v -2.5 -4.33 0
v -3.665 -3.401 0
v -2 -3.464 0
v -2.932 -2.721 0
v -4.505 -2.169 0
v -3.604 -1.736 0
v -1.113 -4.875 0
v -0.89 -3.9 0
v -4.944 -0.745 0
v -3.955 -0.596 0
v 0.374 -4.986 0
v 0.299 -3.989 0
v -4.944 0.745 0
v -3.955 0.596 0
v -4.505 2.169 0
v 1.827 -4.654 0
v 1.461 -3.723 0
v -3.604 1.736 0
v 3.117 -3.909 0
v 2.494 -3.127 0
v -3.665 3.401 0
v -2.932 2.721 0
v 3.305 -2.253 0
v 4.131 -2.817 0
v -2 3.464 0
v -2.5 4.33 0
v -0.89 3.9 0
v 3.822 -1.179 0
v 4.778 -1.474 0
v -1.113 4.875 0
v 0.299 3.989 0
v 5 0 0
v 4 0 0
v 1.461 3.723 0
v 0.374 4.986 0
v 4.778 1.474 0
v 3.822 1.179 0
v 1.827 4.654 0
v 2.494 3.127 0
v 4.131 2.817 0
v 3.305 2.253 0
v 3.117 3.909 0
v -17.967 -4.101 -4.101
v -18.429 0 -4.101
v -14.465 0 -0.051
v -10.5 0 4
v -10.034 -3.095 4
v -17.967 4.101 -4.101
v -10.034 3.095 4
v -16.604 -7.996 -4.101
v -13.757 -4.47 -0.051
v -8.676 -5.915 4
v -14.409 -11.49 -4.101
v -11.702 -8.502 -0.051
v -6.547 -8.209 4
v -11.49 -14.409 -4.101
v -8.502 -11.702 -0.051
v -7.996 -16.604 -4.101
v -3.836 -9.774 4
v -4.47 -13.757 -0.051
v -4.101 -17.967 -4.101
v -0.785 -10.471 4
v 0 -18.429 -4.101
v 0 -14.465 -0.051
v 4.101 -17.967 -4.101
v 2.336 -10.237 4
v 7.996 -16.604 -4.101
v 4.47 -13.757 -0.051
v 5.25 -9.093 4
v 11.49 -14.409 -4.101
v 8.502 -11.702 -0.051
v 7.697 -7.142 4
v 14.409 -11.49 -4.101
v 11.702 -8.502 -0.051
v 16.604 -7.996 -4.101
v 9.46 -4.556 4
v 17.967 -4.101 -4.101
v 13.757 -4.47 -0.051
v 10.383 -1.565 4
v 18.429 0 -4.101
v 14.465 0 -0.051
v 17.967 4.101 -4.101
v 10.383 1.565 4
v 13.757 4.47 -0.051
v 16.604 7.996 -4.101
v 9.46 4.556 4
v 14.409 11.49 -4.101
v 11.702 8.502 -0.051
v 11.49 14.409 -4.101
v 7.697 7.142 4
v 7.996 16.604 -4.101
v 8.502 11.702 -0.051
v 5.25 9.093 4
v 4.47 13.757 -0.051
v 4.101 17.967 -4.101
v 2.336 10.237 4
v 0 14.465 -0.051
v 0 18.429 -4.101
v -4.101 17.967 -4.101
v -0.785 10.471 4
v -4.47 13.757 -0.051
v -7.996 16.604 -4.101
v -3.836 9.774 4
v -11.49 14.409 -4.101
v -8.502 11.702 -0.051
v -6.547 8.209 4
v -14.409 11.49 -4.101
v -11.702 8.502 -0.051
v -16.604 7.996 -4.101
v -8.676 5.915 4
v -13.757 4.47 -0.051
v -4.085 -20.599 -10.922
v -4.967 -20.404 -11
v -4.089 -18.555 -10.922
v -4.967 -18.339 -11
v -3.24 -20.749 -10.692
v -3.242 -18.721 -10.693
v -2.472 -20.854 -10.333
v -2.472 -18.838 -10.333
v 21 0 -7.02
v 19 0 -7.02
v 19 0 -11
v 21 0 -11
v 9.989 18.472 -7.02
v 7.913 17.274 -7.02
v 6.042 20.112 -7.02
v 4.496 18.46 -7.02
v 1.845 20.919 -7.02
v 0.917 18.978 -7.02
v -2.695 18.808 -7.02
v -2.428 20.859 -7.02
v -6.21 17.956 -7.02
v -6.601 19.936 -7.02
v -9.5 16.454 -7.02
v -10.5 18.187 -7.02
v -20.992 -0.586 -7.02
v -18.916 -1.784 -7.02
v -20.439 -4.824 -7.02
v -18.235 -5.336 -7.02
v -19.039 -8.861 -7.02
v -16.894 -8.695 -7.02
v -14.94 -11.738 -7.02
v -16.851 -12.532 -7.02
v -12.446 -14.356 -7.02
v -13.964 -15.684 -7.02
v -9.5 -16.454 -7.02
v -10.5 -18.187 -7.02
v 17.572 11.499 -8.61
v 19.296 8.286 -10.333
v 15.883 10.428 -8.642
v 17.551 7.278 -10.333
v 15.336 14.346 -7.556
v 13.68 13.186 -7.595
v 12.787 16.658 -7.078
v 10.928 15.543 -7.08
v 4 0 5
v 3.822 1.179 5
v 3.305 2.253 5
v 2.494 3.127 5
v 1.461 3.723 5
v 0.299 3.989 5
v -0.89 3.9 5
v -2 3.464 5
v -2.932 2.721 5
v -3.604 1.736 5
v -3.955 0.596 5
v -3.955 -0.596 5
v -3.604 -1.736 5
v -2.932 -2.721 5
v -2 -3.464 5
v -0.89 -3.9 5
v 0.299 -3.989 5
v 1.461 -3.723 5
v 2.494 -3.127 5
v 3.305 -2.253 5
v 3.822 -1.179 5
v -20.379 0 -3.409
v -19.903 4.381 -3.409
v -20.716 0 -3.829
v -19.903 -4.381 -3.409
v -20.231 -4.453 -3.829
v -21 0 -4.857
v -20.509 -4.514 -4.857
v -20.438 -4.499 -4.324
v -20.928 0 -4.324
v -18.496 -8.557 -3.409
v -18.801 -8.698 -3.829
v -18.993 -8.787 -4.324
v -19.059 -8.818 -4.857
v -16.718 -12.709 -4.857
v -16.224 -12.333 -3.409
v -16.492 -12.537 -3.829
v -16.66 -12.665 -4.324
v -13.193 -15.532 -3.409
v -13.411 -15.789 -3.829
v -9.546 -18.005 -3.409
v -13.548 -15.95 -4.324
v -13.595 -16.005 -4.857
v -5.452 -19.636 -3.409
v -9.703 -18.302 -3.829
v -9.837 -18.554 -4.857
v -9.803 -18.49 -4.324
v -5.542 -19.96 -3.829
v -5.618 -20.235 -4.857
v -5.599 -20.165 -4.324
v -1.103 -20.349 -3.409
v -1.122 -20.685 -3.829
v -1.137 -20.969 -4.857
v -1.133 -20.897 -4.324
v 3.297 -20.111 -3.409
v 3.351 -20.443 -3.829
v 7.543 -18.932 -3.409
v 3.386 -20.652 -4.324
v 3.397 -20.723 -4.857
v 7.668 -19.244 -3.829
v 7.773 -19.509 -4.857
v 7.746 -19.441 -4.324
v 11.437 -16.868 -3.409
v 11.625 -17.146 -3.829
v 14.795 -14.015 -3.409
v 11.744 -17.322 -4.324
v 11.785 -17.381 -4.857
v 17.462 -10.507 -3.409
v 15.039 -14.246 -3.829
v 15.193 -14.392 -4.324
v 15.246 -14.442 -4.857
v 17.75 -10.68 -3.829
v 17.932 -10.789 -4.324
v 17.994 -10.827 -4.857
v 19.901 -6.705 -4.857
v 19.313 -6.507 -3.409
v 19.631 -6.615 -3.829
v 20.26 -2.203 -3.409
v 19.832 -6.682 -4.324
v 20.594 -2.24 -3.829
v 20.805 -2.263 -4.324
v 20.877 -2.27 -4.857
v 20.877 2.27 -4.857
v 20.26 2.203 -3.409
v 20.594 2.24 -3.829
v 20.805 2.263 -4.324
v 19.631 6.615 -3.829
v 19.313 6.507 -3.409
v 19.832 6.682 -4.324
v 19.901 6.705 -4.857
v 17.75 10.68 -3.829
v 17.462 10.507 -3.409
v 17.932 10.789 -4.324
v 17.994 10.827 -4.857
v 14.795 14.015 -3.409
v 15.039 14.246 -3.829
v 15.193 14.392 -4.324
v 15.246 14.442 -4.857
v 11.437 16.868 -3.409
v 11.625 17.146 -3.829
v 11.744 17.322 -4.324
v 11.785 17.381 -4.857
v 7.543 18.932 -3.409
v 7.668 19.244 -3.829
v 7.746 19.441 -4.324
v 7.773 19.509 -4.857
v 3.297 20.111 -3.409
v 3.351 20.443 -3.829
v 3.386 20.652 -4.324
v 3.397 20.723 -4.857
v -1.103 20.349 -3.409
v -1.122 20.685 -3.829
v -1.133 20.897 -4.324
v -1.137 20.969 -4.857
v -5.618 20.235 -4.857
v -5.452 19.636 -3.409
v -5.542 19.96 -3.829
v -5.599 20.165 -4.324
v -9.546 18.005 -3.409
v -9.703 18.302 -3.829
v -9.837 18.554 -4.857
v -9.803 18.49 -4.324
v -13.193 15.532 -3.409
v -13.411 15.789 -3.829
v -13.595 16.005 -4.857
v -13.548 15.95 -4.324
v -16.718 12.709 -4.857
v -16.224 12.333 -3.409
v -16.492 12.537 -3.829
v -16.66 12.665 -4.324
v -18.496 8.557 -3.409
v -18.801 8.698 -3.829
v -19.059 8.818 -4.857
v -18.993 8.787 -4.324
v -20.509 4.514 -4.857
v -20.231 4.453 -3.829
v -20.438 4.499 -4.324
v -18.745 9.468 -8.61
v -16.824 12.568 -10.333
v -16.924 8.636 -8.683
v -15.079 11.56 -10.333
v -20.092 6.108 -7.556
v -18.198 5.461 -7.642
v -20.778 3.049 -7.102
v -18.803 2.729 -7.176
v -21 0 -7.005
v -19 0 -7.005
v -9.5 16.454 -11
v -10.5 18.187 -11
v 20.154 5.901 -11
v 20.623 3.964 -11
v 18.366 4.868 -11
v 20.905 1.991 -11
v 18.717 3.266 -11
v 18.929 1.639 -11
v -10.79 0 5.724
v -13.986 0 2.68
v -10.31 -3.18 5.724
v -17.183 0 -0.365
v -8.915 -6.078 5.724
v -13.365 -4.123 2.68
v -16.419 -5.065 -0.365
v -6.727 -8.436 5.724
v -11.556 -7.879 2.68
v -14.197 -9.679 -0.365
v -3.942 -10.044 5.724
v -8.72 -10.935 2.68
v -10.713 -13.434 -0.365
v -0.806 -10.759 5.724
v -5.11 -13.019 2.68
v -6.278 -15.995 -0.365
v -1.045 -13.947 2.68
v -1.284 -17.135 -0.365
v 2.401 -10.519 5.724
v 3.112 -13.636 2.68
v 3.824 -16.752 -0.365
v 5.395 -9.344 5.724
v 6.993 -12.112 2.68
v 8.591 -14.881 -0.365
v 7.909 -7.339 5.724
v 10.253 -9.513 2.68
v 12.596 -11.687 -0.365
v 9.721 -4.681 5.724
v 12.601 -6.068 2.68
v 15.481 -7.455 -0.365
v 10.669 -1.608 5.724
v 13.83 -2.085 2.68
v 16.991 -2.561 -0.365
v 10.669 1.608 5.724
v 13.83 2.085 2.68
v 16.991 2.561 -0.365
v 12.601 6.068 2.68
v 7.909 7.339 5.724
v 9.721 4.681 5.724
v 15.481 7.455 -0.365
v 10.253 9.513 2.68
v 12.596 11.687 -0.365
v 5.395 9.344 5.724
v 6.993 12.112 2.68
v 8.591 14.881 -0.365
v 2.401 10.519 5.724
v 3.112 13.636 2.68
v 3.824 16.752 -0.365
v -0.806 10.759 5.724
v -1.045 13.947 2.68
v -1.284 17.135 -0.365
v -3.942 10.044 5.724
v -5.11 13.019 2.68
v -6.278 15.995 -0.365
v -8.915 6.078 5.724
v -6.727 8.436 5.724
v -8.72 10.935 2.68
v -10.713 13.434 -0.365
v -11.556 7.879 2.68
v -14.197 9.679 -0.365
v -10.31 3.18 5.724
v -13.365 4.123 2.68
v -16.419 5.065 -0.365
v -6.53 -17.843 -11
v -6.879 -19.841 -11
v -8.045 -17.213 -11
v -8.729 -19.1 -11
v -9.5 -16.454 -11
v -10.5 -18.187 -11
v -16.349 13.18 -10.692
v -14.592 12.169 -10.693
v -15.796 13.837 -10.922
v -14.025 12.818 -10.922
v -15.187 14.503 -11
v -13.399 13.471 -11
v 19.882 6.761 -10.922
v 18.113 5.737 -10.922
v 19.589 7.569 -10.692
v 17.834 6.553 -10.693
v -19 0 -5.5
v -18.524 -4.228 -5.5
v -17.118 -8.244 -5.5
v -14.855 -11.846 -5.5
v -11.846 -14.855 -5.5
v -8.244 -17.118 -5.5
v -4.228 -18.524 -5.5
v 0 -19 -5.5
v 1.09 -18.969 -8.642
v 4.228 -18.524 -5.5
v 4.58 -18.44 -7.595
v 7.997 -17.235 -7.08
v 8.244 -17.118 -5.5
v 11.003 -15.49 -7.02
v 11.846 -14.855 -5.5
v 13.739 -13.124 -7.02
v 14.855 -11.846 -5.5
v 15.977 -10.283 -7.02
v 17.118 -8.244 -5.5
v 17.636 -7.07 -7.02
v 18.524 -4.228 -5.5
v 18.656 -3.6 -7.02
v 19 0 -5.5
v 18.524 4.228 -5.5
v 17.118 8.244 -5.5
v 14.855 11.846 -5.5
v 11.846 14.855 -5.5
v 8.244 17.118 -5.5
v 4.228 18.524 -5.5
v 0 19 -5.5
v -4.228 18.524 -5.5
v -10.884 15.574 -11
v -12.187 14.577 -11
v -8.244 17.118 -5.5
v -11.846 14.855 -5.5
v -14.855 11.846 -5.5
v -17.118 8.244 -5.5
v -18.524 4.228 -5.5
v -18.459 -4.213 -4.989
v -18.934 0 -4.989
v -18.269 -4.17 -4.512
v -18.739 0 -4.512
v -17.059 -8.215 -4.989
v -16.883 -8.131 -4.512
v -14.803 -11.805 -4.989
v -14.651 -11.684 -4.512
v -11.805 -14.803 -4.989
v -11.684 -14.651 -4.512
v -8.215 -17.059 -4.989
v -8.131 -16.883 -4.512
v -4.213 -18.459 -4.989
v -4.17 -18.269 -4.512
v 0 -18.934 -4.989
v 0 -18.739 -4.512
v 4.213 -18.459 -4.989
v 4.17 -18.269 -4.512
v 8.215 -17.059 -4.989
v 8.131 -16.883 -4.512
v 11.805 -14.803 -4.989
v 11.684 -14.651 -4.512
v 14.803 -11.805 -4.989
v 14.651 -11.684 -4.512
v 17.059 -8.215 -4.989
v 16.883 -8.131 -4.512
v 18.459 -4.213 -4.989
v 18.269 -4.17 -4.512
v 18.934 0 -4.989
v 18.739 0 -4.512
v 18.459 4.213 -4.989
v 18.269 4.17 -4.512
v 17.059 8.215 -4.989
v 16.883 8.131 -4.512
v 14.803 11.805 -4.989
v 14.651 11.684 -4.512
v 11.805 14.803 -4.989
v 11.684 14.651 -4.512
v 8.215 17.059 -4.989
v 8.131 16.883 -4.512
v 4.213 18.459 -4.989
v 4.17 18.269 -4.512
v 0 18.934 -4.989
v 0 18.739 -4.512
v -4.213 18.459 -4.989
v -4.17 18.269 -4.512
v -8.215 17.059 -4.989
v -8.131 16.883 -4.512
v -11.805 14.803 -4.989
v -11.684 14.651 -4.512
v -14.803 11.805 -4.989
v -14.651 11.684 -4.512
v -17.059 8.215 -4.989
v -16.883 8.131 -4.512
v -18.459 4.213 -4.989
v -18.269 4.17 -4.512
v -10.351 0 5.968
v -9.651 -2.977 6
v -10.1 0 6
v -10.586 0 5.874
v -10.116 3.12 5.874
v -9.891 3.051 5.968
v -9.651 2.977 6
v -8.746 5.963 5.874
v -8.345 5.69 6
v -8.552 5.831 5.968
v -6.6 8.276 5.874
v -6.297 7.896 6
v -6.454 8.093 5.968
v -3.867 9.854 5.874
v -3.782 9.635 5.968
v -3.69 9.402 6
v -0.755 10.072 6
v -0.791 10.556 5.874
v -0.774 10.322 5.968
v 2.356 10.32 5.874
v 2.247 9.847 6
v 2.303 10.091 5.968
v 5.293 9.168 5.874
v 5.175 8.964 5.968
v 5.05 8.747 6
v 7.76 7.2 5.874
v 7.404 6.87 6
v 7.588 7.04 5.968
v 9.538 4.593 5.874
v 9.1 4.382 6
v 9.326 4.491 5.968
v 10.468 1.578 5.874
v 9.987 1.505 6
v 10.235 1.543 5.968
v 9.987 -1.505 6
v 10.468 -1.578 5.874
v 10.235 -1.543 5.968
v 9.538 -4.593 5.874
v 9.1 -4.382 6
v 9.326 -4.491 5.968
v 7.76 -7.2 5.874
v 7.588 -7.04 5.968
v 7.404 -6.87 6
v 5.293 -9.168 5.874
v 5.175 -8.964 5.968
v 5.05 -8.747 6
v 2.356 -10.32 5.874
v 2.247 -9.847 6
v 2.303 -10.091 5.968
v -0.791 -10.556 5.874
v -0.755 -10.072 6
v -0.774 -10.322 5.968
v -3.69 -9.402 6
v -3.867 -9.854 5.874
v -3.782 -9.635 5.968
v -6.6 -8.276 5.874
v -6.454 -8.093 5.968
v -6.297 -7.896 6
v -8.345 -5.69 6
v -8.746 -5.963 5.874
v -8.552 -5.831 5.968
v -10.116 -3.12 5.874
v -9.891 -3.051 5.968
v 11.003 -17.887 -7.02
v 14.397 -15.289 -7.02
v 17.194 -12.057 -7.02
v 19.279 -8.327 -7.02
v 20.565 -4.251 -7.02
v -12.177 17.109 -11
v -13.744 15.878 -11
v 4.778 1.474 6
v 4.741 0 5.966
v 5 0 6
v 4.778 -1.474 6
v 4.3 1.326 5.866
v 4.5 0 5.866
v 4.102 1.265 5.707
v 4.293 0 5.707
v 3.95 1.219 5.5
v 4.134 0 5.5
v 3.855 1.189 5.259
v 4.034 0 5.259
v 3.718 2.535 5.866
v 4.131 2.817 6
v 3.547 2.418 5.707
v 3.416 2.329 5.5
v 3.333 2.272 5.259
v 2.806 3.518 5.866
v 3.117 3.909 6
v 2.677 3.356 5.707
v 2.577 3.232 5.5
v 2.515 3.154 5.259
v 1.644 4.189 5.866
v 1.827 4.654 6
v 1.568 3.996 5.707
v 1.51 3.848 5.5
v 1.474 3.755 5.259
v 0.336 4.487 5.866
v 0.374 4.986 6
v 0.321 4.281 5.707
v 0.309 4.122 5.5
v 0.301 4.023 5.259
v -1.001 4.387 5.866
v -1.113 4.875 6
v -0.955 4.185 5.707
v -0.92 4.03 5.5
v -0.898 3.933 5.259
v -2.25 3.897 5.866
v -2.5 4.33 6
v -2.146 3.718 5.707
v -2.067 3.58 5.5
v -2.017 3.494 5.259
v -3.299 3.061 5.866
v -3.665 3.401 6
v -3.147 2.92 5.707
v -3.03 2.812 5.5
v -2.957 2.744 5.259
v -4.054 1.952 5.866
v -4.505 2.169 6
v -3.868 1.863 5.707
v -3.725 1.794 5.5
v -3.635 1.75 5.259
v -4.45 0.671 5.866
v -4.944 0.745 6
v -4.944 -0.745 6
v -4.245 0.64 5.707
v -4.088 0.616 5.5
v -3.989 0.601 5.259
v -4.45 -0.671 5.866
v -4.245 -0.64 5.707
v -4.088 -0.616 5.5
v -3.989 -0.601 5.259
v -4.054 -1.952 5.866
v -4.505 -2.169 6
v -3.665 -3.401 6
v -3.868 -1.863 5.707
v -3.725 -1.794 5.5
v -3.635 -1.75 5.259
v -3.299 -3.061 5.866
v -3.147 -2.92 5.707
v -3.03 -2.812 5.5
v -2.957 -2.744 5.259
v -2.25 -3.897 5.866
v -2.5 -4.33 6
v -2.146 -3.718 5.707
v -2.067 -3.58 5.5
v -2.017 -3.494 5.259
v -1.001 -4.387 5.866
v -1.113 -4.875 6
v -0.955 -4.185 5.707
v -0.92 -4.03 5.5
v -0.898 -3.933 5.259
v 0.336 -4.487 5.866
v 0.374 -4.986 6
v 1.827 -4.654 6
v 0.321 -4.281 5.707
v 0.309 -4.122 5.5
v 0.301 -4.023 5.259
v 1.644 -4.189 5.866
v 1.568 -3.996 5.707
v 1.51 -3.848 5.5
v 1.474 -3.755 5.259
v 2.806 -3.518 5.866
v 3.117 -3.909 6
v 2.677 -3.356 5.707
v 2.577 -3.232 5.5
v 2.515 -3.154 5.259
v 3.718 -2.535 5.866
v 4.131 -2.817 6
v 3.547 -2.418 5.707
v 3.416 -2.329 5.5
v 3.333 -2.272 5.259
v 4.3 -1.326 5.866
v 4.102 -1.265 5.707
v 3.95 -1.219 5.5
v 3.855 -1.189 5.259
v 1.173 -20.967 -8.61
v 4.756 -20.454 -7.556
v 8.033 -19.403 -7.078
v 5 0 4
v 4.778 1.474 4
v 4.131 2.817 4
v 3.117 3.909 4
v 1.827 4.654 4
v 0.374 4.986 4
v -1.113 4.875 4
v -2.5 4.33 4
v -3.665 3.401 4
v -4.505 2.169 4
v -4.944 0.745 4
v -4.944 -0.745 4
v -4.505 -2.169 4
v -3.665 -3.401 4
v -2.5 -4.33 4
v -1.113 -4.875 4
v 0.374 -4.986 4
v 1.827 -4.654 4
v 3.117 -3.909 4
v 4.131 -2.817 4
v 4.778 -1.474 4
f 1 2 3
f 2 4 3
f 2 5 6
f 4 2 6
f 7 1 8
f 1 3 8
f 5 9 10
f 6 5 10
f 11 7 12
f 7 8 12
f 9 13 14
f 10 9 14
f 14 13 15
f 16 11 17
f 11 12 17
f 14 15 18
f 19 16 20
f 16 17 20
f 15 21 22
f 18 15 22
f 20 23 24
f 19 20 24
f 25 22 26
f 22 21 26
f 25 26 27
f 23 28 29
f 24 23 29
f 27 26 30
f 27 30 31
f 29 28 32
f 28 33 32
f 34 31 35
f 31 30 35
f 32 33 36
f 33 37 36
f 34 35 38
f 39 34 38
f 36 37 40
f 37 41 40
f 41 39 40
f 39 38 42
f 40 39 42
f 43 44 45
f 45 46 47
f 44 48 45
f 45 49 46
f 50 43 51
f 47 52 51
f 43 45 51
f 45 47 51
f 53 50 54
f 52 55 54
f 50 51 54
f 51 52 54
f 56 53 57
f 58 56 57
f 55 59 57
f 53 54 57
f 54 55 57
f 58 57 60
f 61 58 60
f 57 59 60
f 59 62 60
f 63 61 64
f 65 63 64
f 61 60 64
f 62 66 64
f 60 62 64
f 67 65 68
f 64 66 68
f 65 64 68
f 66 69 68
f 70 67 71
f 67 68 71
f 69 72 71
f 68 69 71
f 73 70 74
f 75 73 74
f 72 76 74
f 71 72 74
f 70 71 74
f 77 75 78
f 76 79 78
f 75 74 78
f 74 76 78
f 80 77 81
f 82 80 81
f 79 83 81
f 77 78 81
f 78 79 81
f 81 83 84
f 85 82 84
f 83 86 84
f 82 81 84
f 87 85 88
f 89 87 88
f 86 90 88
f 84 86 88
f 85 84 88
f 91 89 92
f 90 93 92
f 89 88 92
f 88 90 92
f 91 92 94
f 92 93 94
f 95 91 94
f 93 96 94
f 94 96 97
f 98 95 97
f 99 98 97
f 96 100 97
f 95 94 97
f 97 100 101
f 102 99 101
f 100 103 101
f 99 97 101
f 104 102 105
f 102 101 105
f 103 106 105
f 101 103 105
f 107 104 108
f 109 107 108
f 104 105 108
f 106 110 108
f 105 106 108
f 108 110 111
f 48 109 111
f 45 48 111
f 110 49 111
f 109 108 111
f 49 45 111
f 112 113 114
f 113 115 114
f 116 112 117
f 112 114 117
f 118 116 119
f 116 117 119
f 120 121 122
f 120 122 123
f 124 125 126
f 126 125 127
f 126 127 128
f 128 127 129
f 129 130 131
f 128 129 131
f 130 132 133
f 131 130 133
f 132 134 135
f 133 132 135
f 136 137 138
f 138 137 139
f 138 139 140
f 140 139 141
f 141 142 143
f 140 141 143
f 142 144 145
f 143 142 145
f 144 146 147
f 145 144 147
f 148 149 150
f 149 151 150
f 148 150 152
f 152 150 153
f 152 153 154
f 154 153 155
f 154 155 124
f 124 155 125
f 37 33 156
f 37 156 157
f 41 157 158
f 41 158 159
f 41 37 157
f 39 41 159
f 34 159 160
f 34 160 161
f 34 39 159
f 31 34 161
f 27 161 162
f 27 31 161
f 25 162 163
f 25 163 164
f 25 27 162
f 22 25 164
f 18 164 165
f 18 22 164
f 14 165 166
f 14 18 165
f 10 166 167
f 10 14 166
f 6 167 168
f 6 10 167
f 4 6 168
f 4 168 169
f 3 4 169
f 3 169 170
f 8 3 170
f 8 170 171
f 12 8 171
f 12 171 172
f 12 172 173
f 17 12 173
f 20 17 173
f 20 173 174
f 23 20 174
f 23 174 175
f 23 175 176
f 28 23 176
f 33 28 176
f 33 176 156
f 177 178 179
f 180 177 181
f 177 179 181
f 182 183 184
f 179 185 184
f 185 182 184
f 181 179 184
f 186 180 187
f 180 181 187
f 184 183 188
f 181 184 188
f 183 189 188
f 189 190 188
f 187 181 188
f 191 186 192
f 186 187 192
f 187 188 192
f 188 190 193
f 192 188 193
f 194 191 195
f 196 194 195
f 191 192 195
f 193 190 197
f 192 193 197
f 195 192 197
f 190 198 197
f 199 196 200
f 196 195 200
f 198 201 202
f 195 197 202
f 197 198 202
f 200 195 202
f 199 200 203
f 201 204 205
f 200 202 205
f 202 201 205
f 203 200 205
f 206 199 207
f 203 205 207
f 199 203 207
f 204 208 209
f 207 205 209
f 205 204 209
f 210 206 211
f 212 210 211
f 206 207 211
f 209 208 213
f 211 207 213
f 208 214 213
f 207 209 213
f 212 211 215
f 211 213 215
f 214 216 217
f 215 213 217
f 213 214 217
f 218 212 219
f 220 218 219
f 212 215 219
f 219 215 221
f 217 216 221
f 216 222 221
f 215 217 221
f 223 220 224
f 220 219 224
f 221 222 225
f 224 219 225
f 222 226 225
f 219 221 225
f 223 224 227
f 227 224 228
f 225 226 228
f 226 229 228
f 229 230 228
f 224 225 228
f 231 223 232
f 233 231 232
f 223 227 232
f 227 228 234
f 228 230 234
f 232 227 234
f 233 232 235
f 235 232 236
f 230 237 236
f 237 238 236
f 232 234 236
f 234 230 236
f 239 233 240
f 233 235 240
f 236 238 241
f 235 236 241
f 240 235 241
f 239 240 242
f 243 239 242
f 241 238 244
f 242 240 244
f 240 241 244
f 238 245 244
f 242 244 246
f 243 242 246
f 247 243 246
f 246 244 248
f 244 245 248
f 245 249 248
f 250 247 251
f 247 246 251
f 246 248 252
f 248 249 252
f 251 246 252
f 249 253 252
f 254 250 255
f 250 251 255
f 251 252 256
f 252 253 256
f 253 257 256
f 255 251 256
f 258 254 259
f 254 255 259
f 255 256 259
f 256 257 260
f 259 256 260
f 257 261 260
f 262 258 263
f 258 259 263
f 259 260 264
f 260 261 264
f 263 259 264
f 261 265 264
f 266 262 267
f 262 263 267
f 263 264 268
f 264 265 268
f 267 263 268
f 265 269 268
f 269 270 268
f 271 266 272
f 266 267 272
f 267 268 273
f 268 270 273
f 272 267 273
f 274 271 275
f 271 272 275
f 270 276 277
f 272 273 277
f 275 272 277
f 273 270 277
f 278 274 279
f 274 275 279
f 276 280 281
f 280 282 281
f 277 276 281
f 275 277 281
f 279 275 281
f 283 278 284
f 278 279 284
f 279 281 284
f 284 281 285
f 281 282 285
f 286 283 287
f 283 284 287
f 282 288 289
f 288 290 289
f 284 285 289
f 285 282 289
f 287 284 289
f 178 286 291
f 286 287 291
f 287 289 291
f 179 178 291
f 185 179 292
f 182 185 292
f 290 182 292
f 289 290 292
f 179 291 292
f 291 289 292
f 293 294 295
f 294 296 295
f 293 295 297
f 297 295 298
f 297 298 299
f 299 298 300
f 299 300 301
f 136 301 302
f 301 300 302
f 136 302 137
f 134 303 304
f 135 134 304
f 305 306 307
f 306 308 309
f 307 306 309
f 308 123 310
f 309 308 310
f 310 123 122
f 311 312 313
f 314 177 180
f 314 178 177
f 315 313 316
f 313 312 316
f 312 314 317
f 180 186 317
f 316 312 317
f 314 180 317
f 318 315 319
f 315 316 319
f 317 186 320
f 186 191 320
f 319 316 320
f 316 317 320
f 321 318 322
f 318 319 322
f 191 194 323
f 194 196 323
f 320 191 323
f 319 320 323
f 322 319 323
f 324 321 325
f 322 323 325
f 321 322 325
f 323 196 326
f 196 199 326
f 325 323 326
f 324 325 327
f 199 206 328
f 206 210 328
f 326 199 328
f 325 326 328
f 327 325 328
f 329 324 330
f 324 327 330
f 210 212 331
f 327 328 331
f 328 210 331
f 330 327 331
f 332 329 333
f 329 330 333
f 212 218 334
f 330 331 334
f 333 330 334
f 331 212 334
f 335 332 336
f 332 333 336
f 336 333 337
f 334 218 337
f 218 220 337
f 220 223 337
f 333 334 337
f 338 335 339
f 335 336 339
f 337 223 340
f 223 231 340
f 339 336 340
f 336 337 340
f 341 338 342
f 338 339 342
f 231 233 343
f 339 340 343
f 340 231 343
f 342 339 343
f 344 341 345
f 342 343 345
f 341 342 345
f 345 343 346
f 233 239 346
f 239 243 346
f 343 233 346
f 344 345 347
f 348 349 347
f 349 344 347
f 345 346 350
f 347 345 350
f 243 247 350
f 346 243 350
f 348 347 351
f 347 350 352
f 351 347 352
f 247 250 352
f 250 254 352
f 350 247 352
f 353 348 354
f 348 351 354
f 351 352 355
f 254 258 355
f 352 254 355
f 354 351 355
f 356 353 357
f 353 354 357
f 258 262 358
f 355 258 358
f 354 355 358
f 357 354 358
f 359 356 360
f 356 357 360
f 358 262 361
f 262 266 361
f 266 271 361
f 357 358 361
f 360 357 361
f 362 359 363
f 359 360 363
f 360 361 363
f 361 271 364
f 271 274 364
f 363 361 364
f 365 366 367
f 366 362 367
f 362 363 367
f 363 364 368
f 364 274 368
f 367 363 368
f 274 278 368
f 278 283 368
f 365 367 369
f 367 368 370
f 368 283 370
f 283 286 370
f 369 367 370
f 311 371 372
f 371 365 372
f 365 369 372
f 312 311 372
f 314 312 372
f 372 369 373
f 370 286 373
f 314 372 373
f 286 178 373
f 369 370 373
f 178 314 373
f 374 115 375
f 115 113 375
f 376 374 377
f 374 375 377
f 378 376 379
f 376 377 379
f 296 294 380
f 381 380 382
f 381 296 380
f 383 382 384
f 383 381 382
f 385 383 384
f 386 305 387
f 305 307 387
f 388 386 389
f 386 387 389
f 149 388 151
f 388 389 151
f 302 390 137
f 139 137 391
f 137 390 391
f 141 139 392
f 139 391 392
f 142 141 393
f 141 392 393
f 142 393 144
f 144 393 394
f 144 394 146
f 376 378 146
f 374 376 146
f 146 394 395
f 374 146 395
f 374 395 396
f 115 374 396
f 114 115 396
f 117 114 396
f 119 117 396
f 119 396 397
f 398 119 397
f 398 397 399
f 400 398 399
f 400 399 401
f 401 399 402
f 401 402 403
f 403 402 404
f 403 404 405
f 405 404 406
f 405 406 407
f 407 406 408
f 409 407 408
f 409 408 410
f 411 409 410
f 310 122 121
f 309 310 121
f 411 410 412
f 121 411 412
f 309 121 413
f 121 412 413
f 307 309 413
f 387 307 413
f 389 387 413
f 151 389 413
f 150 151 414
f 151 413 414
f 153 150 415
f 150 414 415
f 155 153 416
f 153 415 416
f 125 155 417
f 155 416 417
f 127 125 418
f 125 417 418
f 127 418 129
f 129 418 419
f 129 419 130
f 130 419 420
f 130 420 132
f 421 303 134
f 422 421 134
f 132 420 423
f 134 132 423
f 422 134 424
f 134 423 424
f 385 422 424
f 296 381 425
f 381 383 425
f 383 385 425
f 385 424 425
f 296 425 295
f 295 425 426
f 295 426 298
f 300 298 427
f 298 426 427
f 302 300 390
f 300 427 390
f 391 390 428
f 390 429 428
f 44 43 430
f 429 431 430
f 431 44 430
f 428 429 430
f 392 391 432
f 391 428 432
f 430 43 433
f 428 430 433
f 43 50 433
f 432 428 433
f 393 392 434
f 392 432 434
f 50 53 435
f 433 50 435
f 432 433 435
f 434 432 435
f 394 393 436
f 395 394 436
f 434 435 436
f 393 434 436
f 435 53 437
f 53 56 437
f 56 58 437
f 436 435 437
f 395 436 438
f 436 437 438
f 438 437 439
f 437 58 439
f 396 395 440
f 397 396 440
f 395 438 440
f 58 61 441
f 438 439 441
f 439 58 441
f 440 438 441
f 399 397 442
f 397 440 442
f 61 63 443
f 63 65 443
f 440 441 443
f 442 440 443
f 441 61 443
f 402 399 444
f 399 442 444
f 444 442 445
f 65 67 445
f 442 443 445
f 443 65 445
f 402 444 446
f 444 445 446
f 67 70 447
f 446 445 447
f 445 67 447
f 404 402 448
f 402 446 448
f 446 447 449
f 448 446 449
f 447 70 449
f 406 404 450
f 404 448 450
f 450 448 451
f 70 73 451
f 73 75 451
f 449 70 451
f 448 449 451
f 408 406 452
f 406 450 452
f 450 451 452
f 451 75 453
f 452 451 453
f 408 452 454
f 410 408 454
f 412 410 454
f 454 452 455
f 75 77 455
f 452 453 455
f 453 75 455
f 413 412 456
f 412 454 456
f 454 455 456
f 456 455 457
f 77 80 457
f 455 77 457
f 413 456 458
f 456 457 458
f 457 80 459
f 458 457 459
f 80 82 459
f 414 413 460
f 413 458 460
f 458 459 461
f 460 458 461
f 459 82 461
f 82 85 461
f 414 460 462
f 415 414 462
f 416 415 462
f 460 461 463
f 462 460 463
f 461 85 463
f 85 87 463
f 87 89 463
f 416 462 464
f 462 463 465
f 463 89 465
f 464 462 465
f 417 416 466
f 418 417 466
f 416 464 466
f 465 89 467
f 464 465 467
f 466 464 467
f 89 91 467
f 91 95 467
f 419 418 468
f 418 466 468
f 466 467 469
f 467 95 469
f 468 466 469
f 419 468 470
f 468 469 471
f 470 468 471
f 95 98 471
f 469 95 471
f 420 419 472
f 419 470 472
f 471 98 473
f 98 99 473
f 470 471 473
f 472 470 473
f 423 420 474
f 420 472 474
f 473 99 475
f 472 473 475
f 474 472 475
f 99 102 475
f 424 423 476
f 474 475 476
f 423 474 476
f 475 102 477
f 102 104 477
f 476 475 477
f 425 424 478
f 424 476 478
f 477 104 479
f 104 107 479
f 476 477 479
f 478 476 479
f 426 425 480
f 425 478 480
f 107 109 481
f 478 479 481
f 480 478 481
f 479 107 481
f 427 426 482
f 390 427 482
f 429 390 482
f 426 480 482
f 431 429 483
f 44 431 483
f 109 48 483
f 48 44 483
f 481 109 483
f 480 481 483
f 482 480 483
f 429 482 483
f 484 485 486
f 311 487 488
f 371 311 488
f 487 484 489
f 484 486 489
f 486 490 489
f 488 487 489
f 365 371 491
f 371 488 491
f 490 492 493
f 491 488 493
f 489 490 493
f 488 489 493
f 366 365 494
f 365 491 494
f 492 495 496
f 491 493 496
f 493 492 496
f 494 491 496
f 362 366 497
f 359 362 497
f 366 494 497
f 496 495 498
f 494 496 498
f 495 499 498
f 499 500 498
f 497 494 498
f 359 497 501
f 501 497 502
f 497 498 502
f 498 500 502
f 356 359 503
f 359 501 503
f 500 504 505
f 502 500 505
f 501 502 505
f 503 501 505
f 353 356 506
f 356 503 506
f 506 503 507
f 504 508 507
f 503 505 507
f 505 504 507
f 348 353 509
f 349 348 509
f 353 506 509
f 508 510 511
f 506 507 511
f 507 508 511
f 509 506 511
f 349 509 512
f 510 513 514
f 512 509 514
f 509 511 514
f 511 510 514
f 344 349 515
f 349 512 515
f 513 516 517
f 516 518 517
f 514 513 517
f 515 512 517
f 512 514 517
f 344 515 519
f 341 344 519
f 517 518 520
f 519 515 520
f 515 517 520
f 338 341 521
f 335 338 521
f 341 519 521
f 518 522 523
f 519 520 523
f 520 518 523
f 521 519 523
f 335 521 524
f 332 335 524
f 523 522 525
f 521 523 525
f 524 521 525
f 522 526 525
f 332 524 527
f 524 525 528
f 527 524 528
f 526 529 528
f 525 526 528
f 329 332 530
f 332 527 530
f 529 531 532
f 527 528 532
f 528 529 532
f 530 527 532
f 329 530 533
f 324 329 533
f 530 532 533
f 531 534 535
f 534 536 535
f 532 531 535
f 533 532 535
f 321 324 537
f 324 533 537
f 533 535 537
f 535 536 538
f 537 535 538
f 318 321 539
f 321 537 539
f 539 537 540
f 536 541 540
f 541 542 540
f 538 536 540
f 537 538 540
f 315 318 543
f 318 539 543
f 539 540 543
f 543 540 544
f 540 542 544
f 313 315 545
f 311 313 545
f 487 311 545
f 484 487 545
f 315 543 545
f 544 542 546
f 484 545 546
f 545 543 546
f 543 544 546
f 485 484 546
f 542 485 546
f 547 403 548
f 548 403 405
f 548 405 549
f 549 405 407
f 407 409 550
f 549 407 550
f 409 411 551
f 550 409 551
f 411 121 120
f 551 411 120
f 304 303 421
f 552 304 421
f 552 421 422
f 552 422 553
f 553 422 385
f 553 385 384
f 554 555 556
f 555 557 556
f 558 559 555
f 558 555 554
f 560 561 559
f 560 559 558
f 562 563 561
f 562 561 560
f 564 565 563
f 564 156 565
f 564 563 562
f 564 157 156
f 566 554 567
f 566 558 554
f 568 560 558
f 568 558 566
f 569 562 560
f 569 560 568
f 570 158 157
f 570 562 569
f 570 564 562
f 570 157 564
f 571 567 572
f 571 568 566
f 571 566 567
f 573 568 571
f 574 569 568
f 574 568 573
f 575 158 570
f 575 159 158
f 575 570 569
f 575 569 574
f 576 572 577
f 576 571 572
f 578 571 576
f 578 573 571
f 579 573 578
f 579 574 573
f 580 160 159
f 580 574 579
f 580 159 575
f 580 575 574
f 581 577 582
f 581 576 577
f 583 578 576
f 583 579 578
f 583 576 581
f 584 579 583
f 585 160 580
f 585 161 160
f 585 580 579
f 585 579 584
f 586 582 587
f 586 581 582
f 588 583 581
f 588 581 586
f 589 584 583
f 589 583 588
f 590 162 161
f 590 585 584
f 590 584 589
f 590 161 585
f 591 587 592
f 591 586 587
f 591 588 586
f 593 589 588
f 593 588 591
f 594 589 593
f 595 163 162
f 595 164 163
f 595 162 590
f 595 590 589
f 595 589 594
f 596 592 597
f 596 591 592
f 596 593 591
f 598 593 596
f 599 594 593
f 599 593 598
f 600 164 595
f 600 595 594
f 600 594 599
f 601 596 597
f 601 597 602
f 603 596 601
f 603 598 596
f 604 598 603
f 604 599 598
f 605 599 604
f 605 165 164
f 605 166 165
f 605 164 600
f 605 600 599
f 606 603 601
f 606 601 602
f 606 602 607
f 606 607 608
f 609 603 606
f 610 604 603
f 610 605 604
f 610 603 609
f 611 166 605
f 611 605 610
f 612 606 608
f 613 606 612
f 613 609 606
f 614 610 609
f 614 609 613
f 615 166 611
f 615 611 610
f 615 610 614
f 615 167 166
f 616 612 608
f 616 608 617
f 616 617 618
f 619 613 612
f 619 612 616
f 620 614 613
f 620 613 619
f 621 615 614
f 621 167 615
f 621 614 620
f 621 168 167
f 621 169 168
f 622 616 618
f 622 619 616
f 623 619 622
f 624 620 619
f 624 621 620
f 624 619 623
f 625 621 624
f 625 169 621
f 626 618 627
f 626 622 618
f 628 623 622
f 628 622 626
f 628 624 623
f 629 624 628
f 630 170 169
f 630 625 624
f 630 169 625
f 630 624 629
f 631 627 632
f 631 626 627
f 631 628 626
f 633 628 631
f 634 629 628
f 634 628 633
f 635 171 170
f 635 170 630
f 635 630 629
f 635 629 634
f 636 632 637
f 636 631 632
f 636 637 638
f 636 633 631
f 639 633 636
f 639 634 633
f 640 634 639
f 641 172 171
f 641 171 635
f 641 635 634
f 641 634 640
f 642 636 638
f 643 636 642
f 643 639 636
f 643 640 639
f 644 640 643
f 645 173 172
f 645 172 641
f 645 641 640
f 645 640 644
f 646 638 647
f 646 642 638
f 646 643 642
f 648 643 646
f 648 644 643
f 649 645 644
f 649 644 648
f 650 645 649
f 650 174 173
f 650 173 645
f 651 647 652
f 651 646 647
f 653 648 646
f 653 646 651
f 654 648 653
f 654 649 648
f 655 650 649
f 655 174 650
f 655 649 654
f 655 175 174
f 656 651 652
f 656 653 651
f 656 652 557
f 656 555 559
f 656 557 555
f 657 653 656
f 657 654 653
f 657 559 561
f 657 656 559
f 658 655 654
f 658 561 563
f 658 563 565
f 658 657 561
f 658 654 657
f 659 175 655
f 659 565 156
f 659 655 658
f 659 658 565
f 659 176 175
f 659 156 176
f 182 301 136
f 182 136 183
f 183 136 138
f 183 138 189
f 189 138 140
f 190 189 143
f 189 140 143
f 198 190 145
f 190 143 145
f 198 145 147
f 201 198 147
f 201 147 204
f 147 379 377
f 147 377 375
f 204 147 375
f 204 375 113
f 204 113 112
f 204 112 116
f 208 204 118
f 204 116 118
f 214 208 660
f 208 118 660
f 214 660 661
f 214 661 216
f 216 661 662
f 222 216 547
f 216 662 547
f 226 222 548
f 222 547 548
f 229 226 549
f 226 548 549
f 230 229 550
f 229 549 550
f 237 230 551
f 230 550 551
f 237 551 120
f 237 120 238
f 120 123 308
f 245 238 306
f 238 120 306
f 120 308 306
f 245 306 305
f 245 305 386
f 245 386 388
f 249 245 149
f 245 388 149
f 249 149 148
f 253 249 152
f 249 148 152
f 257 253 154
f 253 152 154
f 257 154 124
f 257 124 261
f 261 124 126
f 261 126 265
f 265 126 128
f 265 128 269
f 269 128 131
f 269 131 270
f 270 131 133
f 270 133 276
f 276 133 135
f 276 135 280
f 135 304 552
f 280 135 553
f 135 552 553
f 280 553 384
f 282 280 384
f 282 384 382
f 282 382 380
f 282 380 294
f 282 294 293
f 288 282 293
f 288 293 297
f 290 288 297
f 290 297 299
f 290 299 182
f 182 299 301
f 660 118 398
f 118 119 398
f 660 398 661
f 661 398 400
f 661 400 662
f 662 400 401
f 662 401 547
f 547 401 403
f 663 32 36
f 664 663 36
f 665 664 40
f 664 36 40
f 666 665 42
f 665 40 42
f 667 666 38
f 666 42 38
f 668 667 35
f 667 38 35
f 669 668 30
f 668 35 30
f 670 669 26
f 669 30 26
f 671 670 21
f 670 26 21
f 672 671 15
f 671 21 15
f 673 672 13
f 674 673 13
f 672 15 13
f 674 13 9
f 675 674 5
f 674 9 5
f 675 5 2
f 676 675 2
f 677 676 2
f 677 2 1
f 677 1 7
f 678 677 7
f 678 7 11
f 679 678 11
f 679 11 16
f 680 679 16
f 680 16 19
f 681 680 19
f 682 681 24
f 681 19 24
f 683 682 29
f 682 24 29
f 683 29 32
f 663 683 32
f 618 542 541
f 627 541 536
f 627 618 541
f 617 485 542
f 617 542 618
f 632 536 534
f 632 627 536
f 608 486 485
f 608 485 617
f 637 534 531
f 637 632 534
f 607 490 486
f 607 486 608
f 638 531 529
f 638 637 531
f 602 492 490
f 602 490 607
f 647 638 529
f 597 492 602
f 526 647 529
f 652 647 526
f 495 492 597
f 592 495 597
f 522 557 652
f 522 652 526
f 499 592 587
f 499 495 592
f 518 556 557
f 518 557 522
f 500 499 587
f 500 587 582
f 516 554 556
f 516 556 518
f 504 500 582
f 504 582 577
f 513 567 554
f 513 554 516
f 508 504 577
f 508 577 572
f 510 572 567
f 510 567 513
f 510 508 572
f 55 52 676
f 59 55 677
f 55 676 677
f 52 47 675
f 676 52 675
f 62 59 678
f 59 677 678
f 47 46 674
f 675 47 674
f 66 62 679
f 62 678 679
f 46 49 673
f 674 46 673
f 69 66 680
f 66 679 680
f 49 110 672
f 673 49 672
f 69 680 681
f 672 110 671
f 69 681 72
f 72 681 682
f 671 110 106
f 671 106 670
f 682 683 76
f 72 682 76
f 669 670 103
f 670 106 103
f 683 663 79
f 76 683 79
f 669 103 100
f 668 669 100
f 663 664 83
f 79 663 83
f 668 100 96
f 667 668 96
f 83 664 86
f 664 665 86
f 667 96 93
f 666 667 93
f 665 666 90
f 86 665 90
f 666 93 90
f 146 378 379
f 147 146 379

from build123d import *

# Parameters (mm, degrees)
ESQUISSE1_R                  = 5
ESQUISSE1_R_2                = 4
BASE_EXTRUSION_DEPTH         = 4
ESQUISSE2_R                  = 10.5
ESQUISSE2_R_2                = 4
BOSS_EXTRU_1_DEPTH           = 2
ENL_V_MAT_EXTRU_1_DEPTH      = 32.670175244
R_P_TITION_CIRCULAIRE1_COUNT = 3
CONG_1_R                     = 5
CONG_2_R                     = 1


with BuildPart() as part:
    # Esquisse1 → Base-Extrusion (new body)
    with BuildSketch(Plane.XY):
        Circle(ESQUISSE1_R)
        Circle(ESQUISSE1_R_2, mode=Mode.SUBTRACT)
    extrude(amount=BASE_EXTRUSION_DEPTH)

    # Esquisse2 → Boss.-Extru.1 (add)
    with BuildSketch(Plane.XY.offset(4)):
        Circle(ESQUISSE2_R)
        Circle(ESQUISSE2_R_2, mode=Mode.SUBTRACT)
    extrude(amount=BOSS_EXTRU_1_DEPTH)

    # Esquisse3 → Boss.-Révol.1 (revolve)
    with BuildSketch(Plane(origin=(0, 0, 0), x_dir=(1, 0, 0), z_dir=(0, 1, 0))):
        with BuildLine():
            Line((-10.5, -6), (-20.379310345, 3.408866995))
            ThreePointArc((-20.379310345, 3.408866995), (-20.83829006, 4.06930426), (-21, 4.857142857))
            Line((-21, 4.857142857), (-21, 6))
            Line((-21, 6), (-21, 11))
            Line((-21, 11), (-19, 11))
            Line((-19, 11), (-19, 5.5))
            ThreePointArc((-19, 5.5), (-18.851832131, 4.744541358), (-18.429282241, 4.101017414))
            Line((-18.429282241, 4.101017414), (-10.5, -4))
            Line((-10.5, -4), (-10.5, -6))
        make_face()
    revolve(axis=Axis((0, 0, -19.062079538), (0, 0, 1)))

    # Esquisse4 → Enlèv. mat.-Extru.1 (cut, through all)
    with BuildSketch(Plane(origin=(0, 0, 0), x_dir=(1, 0, 0), z_dir=(0, 1, 0))):
        with BuildLine():
            Line((11.003277804, 7.020139439), (23.595787982, 7.020139439))
            Line((23.595787982, 7.020139439), (23.595787982, 11.020139439))
            ThreePointArc((23.595787982, 11.020139439), (2.431434716, 55.826808841), (11.003277804, 7.020139439))
        make_face()
    enl_v_mat_extru_1 = extrude(amount=-ENL_V_MAT_EXTRU_1_DEPTH, mode=Mode.SUBTRACT)

    # Répétition circulaire1: Enlèv. mat.-Extru.1 ×3 about axis
    r_p_tition_circulaire1_axis = Axis((0, 0, -50), (0, 0, 1))
    for i in range(1, R_P_TITION_CIRCULAIRE1_COUNT):
        add(enl_v_mat_extru_1.rotate(r_p_tition_circulaire1_axis, i * 360 / R_P_TITION_CIRCULAIRE1_COUNT), mode=Mode.SUBTRACT)

    # Congé1
    cong_1_edges = [part.edges().sort_by_distance(p)[0] for p in [
        (-15.260123677, 12.926551295, -11),
        (-3.564659966, -19.678930416, -11),
        (18.824783643, 6.752379122, -11),
    ]]
    fillet(cong_1_edges, radius=CONG_1_R)

    # Congé2
    cong_2_edges = [part.edges().sort_by_distance(p)[0] for p in [
        (10.5, 0, 6),
        (-4, 0, 6),
    ]]
    fillet(cong_2_edges, radius=CONG_2_R)


solid = part.part
